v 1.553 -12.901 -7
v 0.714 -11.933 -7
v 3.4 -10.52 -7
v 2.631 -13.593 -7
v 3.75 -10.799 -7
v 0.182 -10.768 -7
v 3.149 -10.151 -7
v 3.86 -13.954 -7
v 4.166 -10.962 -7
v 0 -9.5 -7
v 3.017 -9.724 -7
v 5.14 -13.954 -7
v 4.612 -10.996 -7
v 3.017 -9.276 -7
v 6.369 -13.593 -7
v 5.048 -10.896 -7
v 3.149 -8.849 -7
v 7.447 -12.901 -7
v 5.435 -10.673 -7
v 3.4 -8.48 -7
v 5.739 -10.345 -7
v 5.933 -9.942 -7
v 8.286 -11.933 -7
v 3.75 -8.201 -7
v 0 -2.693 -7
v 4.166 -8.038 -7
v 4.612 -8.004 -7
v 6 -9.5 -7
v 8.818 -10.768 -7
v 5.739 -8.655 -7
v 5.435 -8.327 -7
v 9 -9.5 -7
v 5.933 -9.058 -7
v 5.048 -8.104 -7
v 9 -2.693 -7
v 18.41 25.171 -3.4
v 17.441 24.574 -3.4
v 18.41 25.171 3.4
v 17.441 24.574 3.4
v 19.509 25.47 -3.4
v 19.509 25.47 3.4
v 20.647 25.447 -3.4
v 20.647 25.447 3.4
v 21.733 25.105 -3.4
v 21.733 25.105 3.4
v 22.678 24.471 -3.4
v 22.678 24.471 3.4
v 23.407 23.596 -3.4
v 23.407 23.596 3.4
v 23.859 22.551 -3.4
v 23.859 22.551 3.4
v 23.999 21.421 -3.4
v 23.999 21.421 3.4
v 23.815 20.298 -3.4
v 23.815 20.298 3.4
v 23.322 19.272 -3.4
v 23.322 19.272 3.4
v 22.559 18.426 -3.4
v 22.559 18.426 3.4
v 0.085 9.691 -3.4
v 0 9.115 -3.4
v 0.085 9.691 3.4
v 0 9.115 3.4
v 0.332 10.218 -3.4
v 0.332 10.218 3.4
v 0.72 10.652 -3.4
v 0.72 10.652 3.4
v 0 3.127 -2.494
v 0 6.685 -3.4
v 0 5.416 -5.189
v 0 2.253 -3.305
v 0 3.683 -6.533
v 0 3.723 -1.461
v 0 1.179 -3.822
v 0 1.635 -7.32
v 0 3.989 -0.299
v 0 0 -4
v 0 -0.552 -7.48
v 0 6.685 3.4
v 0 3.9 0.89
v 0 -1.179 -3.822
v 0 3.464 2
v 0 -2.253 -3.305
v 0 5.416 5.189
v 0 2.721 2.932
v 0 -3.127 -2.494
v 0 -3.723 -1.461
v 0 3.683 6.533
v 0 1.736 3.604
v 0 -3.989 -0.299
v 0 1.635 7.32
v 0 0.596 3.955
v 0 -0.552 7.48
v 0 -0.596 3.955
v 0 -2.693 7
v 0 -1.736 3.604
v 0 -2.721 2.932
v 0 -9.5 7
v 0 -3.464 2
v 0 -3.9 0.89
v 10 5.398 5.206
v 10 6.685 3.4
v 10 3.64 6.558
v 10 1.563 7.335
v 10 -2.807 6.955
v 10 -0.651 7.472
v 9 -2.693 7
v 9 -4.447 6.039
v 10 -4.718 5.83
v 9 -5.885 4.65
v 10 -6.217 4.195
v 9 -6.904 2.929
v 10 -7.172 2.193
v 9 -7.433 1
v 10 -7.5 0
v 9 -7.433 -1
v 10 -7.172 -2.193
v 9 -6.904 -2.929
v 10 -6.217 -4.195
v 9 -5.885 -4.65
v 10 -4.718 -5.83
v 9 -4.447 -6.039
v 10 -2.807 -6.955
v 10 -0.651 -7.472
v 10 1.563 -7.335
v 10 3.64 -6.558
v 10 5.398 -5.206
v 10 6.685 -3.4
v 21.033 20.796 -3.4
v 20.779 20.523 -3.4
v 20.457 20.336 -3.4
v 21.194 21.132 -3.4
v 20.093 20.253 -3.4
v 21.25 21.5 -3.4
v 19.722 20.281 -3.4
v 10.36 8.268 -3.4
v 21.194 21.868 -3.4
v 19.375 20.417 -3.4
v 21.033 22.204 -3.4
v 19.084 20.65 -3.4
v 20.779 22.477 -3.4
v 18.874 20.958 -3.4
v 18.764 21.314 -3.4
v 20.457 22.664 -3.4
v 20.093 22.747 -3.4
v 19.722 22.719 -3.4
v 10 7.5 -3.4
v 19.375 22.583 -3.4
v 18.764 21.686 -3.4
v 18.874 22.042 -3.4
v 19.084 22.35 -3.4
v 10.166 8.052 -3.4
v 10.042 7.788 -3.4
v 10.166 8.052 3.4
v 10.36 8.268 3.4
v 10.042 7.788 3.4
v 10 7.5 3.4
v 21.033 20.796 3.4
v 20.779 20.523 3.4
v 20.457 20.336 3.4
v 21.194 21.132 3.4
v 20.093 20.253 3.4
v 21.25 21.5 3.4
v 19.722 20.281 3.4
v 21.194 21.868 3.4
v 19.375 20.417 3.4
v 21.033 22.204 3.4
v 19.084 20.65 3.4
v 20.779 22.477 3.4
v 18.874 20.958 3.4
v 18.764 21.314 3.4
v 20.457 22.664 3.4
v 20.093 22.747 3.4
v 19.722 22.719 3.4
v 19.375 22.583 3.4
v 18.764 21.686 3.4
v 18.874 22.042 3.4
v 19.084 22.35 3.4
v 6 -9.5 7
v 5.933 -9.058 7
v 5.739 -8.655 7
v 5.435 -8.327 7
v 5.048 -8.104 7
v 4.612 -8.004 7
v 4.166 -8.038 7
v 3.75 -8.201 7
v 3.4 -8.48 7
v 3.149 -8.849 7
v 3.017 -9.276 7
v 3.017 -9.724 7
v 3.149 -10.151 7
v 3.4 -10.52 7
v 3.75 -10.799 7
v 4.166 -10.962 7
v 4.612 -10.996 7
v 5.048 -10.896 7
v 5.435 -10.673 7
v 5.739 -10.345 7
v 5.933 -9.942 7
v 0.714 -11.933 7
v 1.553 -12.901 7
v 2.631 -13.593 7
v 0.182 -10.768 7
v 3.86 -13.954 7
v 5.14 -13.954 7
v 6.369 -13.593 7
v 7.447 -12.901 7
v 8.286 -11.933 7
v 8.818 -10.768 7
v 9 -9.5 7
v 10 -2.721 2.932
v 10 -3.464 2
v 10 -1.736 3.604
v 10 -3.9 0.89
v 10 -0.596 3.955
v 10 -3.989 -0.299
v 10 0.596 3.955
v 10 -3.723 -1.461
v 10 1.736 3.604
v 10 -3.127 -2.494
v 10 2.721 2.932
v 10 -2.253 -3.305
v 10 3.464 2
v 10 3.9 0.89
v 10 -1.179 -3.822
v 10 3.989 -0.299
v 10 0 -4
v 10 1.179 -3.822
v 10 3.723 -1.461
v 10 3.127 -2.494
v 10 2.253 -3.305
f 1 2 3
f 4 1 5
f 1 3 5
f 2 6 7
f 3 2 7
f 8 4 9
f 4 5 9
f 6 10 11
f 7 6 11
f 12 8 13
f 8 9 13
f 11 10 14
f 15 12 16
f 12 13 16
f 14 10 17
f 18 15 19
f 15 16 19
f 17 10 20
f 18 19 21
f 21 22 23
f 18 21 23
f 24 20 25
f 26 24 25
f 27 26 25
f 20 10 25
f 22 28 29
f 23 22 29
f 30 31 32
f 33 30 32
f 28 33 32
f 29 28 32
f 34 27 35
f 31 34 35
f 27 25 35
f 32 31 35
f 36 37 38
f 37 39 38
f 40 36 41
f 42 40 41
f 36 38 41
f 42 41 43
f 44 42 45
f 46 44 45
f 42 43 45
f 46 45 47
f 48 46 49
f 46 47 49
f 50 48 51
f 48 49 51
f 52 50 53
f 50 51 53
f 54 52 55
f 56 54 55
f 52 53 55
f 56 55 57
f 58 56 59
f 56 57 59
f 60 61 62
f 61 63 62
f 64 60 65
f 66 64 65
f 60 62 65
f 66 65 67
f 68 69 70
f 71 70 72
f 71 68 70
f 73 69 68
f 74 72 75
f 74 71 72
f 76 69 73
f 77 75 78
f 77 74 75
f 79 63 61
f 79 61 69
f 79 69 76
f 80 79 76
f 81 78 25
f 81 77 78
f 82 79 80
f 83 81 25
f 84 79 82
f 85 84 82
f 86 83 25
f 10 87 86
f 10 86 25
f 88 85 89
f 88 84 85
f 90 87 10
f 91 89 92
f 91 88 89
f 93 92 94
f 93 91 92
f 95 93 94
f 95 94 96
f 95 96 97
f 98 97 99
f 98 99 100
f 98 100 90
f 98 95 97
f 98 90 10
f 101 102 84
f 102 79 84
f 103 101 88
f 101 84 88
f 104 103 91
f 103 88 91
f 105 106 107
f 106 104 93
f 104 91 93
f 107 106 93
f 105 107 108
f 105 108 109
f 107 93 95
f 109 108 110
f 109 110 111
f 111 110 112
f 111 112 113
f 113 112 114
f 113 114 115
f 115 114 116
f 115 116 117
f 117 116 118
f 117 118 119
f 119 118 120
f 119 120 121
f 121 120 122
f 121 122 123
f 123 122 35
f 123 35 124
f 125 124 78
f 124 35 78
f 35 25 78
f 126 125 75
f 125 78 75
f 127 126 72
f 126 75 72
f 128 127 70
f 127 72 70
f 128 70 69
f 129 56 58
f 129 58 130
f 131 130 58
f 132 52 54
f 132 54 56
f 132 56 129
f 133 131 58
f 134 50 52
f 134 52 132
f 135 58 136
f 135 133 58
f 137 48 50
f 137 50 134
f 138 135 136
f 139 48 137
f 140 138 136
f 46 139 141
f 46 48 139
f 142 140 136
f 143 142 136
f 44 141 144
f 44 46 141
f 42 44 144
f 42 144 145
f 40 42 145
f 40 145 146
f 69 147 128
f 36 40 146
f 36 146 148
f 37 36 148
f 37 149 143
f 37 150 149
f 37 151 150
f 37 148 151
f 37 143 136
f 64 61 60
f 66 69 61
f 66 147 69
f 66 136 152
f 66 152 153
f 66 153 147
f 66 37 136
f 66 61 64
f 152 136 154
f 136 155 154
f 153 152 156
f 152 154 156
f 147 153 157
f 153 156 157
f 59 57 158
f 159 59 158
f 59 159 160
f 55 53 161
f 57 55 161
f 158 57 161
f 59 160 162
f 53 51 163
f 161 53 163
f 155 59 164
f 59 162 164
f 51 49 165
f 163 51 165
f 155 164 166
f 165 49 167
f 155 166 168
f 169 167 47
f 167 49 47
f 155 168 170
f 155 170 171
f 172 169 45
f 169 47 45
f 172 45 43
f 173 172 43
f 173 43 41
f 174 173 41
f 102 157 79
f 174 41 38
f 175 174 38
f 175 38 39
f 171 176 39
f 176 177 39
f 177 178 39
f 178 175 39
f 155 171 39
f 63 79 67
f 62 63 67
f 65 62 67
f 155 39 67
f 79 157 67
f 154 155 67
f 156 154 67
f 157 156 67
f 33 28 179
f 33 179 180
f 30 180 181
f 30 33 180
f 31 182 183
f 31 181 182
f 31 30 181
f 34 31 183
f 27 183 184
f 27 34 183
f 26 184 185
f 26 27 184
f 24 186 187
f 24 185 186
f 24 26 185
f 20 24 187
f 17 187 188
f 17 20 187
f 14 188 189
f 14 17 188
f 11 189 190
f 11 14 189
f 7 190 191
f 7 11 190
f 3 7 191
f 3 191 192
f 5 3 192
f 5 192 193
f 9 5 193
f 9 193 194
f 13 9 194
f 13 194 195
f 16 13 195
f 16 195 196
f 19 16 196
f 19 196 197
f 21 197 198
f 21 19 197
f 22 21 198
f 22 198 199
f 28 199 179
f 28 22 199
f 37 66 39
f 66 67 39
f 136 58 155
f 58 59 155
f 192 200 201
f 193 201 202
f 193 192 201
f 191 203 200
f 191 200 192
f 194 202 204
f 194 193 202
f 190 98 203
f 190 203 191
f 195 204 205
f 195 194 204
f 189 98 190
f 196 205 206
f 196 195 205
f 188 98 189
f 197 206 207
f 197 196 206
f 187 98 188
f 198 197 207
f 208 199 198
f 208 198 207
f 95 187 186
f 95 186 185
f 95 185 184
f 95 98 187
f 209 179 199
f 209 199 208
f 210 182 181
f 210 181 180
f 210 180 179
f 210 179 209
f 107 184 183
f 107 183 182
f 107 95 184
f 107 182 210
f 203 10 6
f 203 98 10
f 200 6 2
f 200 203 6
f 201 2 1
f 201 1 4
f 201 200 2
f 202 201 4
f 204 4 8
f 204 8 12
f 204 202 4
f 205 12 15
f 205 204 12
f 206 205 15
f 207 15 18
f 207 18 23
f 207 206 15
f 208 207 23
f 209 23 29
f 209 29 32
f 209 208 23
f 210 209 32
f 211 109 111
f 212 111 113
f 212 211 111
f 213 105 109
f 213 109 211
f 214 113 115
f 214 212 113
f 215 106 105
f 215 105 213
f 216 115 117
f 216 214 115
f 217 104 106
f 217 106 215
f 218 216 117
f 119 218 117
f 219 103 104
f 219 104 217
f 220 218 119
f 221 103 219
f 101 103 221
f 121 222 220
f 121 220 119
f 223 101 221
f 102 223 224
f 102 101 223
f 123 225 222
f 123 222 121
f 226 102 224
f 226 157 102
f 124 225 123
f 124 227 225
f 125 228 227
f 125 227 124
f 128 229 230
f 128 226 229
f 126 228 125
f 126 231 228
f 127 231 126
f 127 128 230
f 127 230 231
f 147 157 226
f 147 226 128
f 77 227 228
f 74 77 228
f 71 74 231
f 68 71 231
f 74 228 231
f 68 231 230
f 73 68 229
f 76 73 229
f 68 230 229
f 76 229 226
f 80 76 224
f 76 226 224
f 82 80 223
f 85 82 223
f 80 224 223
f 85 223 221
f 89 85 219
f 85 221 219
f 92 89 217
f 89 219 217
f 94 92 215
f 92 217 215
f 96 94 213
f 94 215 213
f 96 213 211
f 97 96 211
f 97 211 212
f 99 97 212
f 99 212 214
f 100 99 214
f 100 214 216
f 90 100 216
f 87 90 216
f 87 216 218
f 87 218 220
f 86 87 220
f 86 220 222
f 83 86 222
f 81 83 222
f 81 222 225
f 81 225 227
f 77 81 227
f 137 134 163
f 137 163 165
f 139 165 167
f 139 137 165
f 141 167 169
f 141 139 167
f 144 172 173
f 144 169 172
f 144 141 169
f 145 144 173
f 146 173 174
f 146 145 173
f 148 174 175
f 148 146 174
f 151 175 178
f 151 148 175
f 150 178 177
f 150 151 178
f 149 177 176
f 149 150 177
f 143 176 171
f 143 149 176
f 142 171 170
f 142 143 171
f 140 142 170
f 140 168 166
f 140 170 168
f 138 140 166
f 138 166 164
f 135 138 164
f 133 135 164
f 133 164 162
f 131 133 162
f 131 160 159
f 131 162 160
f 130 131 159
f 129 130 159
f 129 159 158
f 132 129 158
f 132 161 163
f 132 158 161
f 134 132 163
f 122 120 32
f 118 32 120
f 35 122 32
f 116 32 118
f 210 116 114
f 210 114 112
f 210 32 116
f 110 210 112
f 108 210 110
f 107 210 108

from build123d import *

# Parameters (mm, degrees)
SKETCH1_R               = 7.5
BOSS_EXTRUDE1_DEPTH     = 10
BOSS_EXTRUDE2_DEPTH     = 3.4
BOSS_EXTRUDE3_DEPTH     = 7
CUT_EXTRUDE1_DEPTH      = 38.901187316
CUT_EXTRUDE1_DEPTH_BACK = 38.901187316
SKETCH4_R               = 1.5
SKETCH5_R               = 4
CUT_EXTRUDE2_DEPTH      = 31.041637772
CUT_EXTRUDE3_DEPTH      = 37.675059645
CUT_EXTRUDE3_DEPTH_BACK = 37.675059645
SKETCH6_R               = 1.25


with BuildPart() as part:
    # Sketch1 → Boss-Extrude1 (new body)
    with BuildSketch(Plane(origin=(0, 0, 0), x_dir=(0, 0, -1), z_dir=(1, 0, 0))):
        Circle(SKETCH1_R)
    extrude(amount=BOSS_EXTRUDE1_DEPTH)

    # Sketch2 → Boss-Extrude2 (add, symmetric)
    with BuildSketch(Plane.XY):
        with BuildLine():
            Line((0, 0), (0, 9.115122314))
            ThreePointArc((0, 9.115122314), (0.188996508, 9.963807387), (0.720266353, 10.652093944))
            Line((0.720266353, 10.652093944), (17.440532706, 24.573943261))
            ThreePointArc((17.440532706, 24.573943261), (23.073943261, 24.059467294), (22.559467294, 18.426056739))
            Line((22.559467294, 18.426056739), (10.360133176, 8.268485815))
            ThreePointArc((10.360133176, 8.268485815), (10.094498254, 7.924342536), (10, 7.5))
            Line((10, 7.5), (10, 0))
            Line((10, 0), (0, 0))
        make_face()
    extrude(amount=BOSS_EXTRUDE2_DEPTH, both=True)

    # Sketch3 → Boss-Extrude3 (add, symmetric)
    with BuildSketch(Plane.XY):
        with BuildLine():
            Line((9, -9.5), (9, 0))
            Line((9, 0), (0, 0))
            Line((0, 0), (0, -9.5))
            ThreePointArc((0, -9.5), (4.5, -14), (9, -9.5))
        make_face()
    extrude(amount=BOSS_EXTRUDE3_DEPTH, both=True)

    # Sketch4 → Cut-Extrude1 (cut, two sides: drawn at the far end of the back side and taken through both)
    with BuildSketch(Plane.XY.offset(7).offset(-CUT_EXTRUDE1_DEPTH_BACK)):
        with Locations((4.5, -9.5)):
            Circle(SKETCH4_R)
    extrude(amount=CUT_EXTRUDE1_DEPTH + CUT_EXTRUDE1_DEPTH_BACK, mode=Mode.SUBTRACT)

    # Sketch5 → Cut-Extrude2 (cut, through all)
    with BuildSketch(Plane(origin=(10, 0, 0), x_dir=(0, 0, -1), z_dir=(1, 0, 0))):
        Circle(SKETCH5_R)
    extrude(amount=-CUT_EXTRUDE2_DEPTH, mode=Mode.SUBTRACT)

    # Sketch6 → Cut-Extrude3 (cut, two sides: drawn at the far end of the back side and taken through both)
    with BuildSketch(Plane.XY.offset(3.4).offset(-CUT_EXTRUDE3_DEPTH_BACK)):
        with Locations((20, 21.5)):
            Circle(SKETCH6_R)
    extrude(amount=CUT_EXTRUDE3_DEPTH + CUT_EXTRUDE3_DEPTH_BACK, mode=Mode.SUBTRACT)


solid = part.part
